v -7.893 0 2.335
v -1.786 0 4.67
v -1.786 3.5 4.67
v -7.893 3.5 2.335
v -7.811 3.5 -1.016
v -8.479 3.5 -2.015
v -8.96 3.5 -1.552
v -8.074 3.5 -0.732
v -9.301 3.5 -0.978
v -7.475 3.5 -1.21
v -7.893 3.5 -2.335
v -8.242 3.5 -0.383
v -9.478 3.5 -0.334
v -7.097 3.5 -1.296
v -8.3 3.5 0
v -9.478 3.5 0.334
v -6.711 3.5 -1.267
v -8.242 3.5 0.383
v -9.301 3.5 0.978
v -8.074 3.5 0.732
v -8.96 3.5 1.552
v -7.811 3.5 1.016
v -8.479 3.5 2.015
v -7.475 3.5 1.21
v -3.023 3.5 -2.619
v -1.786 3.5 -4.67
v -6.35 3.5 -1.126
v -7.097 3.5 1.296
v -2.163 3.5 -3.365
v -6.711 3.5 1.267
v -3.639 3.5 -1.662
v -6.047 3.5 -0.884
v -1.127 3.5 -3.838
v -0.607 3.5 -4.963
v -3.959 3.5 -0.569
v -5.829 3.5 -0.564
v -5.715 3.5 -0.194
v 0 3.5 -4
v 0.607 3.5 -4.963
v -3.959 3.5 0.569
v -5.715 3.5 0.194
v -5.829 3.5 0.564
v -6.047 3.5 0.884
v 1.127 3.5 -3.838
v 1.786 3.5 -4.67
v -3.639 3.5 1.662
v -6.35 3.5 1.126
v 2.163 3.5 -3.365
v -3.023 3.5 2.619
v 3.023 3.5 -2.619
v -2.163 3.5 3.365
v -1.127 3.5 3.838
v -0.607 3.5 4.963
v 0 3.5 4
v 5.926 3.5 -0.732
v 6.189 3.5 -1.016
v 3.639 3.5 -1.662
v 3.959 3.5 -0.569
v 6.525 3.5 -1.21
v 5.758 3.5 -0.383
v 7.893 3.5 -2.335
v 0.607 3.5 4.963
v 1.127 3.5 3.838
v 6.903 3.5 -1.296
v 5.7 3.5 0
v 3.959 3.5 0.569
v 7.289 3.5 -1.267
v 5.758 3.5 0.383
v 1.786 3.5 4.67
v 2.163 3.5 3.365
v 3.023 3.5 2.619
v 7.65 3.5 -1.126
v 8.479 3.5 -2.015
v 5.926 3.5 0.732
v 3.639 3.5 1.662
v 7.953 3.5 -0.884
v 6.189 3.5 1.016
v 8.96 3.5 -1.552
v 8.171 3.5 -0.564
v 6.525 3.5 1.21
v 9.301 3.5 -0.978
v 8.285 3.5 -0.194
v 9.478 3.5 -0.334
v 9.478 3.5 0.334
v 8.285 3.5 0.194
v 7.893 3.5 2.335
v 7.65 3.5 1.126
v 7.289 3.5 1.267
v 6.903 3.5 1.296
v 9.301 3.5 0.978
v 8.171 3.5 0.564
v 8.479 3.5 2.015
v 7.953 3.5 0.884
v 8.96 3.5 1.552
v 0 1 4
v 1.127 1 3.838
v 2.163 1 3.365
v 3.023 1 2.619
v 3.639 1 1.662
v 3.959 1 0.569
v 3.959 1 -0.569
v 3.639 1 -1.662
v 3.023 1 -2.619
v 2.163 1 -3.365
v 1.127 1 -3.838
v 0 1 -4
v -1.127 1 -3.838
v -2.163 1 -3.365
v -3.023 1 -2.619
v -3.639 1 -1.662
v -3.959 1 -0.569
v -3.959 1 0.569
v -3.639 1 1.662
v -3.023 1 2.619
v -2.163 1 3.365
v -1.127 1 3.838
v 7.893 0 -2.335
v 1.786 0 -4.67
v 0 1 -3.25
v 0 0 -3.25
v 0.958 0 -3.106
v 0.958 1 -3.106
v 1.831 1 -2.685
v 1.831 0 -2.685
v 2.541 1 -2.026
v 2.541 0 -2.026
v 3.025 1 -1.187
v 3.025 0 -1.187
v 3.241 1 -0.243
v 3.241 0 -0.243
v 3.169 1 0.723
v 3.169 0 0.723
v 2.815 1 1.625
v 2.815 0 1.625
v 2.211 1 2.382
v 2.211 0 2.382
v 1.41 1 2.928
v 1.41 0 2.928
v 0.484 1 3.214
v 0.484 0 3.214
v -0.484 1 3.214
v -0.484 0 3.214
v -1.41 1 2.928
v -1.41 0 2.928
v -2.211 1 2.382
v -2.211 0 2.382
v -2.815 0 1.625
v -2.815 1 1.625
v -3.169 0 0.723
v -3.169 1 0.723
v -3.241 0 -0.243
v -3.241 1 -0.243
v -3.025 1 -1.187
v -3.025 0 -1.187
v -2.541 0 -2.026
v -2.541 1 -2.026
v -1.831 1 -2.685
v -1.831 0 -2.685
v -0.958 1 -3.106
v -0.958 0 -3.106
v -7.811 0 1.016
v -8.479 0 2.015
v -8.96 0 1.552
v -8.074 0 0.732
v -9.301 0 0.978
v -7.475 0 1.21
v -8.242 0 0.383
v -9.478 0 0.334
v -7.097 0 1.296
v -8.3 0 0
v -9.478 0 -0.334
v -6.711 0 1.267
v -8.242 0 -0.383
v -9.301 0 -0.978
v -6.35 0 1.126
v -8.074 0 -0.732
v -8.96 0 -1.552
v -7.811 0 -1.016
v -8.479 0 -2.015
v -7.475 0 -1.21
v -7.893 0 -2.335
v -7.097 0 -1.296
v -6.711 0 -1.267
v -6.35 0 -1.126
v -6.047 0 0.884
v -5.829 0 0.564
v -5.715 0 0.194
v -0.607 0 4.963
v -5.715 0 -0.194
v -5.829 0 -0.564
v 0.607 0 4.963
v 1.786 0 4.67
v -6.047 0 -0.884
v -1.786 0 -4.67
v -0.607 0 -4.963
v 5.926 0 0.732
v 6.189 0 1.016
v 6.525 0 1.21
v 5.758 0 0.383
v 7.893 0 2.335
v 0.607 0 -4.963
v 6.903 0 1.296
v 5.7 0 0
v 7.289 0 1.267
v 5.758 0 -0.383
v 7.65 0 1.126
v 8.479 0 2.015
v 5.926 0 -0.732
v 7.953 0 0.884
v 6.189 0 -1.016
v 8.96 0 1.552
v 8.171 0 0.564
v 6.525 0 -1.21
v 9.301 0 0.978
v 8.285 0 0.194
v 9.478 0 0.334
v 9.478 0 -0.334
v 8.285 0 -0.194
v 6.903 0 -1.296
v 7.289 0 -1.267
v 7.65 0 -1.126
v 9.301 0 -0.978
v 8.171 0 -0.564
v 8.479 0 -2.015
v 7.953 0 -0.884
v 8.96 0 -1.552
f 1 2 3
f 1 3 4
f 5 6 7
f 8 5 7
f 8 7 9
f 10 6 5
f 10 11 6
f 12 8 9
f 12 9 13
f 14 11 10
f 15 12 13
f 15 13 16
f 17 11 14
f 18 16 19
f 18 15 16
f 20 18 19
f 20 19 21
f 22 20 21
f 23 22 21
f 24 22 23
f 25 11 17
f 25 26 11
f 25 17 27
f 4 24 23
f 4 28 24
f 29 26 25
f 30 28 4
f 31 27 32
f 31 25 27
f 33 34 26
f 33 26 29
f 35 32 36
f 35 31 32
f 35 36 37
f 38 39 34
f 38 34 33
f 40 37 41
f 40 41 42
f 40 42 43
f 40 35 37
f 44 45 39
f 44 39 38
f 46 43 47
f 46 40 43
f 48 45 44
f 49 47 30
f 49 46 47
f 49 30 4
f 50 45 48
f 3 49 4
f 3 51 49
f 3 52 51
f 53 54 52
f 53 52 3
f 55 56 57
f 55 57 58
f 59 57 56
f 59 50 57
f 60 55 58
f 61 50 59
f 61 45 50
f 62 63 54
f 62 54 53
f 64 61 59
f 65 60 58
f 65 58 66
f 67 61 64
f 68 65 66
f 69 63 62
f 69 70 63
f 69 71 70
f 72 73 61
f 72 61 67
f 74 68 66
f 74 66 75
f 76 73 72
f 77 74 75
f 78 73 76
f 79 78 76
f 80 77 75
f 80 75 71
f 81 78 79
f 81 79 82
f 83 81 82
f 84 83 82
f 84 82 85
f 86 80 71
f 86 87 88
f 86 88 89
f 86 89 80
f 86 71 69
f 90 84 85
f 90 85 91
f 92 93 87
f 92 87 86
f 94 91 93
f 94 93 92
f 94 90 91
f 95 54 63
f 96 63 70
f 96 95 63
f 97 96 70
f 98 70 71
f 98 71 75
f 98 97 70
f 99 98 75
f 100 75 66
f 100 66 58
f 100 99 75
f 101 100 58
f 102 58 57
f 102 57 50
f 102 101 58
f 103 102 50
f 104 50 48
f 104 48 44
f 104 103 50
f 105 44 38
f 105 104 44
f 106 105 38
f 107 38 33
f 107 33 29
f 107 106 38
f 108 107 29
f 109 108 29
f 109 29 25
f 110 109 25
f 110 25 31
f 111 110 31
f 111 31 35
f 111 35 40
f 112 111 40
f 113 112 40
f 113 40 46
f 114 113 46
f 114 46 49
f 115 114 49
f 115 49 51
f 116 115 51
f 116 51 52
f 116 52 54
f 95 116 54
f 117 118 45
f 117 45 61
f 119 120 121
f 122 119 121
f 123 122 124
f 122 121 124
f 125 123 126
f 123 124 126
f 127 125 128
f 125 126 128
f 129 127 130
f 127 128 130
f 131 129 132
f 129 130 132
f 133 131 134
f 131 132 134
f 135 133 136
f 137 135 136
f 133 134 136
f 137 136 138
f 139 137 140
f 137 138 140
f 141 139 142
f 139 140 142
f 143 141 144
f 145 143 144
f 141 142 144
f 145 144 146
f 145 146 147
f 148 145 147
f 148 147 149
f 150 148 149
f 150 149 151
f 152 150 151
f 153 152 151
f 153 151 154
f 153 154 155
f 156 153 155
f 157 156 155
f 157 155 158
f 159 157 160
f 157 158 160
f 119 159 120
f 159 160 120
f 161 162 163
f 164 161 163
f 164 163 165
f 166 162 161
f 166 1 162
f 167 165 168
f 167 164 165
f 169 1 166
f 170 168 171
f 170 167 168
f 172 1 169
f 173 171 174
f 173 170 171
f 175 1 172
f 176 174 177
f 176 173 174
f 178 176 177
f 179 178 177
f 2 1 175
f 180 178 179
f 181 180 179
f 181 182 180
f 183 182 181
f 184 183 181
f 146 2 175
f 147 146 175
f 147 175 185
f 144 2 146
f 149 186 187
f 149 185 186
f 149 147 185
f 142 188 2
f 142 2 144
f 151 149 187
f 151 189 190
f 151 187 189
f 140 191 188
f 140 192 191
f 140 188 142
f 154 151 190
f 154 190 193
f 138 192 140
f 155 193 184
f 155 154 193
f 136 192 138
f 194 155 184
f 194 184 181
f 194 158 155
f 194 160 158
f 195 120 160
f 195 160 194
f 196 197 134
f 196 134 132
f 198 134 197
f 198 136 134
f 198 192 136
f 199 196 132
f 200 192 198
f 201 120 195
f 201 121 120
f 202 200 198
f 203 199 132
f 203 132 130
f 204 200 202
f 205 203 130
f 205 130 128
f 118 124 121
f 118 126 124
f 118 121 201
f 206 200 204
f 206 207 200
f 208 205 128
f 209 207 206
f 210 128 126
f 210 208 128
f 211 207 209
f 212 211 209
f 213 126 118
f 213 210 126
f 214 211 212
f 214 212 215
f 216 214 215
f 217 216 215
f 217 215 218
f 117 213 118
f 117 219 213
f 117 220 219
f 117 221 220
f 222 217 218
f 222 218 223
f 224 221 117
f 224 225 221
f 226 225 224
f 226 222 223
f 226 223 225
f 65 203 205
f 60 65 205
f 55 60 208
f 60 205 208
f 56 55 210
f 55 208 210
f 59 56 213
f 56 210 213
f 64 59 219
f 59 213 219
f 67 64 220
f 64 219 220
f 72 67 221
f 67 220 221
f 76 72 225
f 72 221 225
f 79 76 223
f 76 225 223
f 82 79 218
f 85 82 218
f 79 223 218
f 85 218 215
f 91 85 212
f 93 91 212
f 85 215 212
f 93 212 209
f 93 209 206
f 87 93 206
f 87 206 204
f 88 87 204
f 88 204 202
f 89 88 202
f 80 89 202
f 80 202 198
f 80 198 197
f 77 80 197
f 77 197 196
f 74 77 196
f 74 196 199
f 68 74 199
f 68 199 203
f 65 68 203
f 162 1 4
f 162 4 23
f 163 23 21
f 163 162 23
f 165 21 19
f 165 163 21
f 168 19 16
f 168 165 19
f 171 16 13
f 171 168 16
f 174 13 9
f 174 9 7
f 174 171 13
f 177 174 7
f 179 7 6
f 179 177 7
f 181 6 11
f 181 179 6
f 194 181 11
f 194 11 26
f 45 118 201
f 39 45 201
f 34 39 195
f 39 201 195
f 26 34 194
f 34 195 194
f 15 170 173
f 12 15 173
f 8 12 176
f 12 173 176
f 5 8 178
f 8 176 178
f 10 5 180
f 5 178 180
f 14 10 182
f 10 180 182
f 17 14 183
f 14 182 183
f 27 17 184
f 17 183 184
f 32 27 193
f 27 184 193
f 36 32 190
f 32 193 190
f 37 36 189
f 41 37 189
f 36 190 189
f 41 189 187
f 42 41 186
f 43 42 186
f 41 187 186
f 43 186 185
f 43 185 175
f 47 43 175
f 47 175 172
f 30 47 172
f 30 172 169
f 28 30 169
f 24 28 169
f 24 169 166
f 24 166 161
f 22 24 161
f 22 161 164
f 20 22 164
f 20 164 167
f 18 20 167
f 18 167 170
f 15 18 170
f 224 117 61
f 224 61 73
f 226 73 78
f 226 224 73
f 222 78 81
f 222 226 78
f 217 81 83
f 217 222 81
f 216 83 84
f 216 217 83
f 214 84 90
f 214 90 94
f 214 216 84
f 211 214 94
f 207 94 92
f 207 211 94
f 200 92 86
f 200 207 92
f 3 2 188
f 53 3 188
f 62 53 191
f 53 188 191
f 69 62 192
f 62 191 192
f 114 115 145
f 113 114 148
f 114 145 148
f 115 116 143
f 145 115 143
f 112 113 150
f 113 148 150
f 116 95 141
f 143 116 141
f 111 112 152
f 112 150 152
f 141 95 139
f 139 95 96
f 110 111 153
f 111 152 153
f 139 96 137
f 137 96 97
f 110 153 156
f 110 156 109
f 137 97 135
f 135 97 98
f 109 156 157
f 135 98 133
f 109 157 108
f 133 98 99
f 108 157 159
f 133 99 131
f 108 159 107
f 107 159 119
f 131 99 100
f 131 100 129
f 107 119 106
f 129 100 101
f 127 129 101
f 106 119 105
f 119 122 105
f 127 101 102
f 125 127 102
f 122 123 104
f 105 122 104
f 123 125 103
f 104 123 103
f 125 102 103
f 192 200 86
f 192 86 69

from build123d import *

# Parameters (mm, degrees)
SKETCH1_R            = 5
SKETCH1_R_2          = 4
BOSS_EXTRUDE1_DEPTH  = 3.5
BOSS_EXTRUDE2_DEPTH  = 3.5
M2_CLEARANCE_HOLE1_D = 2.6
SKETCH6_R            = 4
SKETCH6_R_2          = 3.25
BOSS_EXTRUDE4_DEPTH  = 1


with BuildPart() as part:
    # Sketch1 → Boss-Extrude1 (new body)
    with BuildSketch(Plane(origin=(0, 0, 0), x_dir=(1, 0, 0), z_dir=(0, 1, 0))):
        with Locations(Location((0, 0, 0), (0, 0, 270))):
            Circle(SKETCH1_R)
        with Locations(Location((0, 0, 0), (0, 0, 270))):
            Circle(SKETCH1_R_2, mode=Mode.SUBTRACT)
    extrude(amount=BOSS_EXTRUDE1_DEPTH)

    # Sketch2 → Boss-Extrude2 (add)
    with BuildSketch(Plane(origin=(0, 0, 0), x_dir=(1, 0, 0), z_dir=(0, 1, 0))):
        with BuildLine():
            Line((-7.892857143, 2.335124434), (-1.785714286, 4.670248868))
            ThreePointArc((-1.785714286, 4.670248868), (-5, 0), (-1.785714286, -4.670248868))
            Line((-1.785714286, -4.670248868), (-7.892857143, -2.335124434))
            ThreePointArc((-7.892857143, -2.335124434), (-9.5, 0), (-7.892857143, 2.335124434))
        make_face()
        with BuildLine():
            Line((7.892857143, -2.335124434), (1.785714286, -4.670248868))
            ThreePointArc((1.785714286, -4.670248868), (5, 0), (1.785714286, 4.670248868))
            Line((1.785714286, 4.670248868), (7.892857143, 2.335124434))
            ThreePointArc((7.892857143, 2.335124434), (9.5, 0), (7.892857143, -2.335124434))
        make_face()
    extrude(amount=BOSS_EXTRUDE2_DEPTH)

    # M2 Clearance Hole1 (through all)
    with Locations(Plane(origin=(0, 3.5, 0), x_dir=(1, 0, 0), z_dir=(0, 1, 0))):
        with Locations((-7, 0), (7, 0)):
            Hole(M2_CLEARANCE_HOLE1_D / 2)

    # Sketch6 → Boss-Extrude4 (add)
    with BuildSketch(Plane.XZ):
        with Locations(Location((0, 0, 0), (0, 0, 270))):
            Circle(SKETCH6_R)
        with Locations(Location((0, 0, 0), (0, 0, 270))):
            Circle(SKETCH6_R_2, mode=Mode.SUBTRACT)
    extrude(amount=-BOSS_EXTRUDE4_DEPTH)


solid = part.part
